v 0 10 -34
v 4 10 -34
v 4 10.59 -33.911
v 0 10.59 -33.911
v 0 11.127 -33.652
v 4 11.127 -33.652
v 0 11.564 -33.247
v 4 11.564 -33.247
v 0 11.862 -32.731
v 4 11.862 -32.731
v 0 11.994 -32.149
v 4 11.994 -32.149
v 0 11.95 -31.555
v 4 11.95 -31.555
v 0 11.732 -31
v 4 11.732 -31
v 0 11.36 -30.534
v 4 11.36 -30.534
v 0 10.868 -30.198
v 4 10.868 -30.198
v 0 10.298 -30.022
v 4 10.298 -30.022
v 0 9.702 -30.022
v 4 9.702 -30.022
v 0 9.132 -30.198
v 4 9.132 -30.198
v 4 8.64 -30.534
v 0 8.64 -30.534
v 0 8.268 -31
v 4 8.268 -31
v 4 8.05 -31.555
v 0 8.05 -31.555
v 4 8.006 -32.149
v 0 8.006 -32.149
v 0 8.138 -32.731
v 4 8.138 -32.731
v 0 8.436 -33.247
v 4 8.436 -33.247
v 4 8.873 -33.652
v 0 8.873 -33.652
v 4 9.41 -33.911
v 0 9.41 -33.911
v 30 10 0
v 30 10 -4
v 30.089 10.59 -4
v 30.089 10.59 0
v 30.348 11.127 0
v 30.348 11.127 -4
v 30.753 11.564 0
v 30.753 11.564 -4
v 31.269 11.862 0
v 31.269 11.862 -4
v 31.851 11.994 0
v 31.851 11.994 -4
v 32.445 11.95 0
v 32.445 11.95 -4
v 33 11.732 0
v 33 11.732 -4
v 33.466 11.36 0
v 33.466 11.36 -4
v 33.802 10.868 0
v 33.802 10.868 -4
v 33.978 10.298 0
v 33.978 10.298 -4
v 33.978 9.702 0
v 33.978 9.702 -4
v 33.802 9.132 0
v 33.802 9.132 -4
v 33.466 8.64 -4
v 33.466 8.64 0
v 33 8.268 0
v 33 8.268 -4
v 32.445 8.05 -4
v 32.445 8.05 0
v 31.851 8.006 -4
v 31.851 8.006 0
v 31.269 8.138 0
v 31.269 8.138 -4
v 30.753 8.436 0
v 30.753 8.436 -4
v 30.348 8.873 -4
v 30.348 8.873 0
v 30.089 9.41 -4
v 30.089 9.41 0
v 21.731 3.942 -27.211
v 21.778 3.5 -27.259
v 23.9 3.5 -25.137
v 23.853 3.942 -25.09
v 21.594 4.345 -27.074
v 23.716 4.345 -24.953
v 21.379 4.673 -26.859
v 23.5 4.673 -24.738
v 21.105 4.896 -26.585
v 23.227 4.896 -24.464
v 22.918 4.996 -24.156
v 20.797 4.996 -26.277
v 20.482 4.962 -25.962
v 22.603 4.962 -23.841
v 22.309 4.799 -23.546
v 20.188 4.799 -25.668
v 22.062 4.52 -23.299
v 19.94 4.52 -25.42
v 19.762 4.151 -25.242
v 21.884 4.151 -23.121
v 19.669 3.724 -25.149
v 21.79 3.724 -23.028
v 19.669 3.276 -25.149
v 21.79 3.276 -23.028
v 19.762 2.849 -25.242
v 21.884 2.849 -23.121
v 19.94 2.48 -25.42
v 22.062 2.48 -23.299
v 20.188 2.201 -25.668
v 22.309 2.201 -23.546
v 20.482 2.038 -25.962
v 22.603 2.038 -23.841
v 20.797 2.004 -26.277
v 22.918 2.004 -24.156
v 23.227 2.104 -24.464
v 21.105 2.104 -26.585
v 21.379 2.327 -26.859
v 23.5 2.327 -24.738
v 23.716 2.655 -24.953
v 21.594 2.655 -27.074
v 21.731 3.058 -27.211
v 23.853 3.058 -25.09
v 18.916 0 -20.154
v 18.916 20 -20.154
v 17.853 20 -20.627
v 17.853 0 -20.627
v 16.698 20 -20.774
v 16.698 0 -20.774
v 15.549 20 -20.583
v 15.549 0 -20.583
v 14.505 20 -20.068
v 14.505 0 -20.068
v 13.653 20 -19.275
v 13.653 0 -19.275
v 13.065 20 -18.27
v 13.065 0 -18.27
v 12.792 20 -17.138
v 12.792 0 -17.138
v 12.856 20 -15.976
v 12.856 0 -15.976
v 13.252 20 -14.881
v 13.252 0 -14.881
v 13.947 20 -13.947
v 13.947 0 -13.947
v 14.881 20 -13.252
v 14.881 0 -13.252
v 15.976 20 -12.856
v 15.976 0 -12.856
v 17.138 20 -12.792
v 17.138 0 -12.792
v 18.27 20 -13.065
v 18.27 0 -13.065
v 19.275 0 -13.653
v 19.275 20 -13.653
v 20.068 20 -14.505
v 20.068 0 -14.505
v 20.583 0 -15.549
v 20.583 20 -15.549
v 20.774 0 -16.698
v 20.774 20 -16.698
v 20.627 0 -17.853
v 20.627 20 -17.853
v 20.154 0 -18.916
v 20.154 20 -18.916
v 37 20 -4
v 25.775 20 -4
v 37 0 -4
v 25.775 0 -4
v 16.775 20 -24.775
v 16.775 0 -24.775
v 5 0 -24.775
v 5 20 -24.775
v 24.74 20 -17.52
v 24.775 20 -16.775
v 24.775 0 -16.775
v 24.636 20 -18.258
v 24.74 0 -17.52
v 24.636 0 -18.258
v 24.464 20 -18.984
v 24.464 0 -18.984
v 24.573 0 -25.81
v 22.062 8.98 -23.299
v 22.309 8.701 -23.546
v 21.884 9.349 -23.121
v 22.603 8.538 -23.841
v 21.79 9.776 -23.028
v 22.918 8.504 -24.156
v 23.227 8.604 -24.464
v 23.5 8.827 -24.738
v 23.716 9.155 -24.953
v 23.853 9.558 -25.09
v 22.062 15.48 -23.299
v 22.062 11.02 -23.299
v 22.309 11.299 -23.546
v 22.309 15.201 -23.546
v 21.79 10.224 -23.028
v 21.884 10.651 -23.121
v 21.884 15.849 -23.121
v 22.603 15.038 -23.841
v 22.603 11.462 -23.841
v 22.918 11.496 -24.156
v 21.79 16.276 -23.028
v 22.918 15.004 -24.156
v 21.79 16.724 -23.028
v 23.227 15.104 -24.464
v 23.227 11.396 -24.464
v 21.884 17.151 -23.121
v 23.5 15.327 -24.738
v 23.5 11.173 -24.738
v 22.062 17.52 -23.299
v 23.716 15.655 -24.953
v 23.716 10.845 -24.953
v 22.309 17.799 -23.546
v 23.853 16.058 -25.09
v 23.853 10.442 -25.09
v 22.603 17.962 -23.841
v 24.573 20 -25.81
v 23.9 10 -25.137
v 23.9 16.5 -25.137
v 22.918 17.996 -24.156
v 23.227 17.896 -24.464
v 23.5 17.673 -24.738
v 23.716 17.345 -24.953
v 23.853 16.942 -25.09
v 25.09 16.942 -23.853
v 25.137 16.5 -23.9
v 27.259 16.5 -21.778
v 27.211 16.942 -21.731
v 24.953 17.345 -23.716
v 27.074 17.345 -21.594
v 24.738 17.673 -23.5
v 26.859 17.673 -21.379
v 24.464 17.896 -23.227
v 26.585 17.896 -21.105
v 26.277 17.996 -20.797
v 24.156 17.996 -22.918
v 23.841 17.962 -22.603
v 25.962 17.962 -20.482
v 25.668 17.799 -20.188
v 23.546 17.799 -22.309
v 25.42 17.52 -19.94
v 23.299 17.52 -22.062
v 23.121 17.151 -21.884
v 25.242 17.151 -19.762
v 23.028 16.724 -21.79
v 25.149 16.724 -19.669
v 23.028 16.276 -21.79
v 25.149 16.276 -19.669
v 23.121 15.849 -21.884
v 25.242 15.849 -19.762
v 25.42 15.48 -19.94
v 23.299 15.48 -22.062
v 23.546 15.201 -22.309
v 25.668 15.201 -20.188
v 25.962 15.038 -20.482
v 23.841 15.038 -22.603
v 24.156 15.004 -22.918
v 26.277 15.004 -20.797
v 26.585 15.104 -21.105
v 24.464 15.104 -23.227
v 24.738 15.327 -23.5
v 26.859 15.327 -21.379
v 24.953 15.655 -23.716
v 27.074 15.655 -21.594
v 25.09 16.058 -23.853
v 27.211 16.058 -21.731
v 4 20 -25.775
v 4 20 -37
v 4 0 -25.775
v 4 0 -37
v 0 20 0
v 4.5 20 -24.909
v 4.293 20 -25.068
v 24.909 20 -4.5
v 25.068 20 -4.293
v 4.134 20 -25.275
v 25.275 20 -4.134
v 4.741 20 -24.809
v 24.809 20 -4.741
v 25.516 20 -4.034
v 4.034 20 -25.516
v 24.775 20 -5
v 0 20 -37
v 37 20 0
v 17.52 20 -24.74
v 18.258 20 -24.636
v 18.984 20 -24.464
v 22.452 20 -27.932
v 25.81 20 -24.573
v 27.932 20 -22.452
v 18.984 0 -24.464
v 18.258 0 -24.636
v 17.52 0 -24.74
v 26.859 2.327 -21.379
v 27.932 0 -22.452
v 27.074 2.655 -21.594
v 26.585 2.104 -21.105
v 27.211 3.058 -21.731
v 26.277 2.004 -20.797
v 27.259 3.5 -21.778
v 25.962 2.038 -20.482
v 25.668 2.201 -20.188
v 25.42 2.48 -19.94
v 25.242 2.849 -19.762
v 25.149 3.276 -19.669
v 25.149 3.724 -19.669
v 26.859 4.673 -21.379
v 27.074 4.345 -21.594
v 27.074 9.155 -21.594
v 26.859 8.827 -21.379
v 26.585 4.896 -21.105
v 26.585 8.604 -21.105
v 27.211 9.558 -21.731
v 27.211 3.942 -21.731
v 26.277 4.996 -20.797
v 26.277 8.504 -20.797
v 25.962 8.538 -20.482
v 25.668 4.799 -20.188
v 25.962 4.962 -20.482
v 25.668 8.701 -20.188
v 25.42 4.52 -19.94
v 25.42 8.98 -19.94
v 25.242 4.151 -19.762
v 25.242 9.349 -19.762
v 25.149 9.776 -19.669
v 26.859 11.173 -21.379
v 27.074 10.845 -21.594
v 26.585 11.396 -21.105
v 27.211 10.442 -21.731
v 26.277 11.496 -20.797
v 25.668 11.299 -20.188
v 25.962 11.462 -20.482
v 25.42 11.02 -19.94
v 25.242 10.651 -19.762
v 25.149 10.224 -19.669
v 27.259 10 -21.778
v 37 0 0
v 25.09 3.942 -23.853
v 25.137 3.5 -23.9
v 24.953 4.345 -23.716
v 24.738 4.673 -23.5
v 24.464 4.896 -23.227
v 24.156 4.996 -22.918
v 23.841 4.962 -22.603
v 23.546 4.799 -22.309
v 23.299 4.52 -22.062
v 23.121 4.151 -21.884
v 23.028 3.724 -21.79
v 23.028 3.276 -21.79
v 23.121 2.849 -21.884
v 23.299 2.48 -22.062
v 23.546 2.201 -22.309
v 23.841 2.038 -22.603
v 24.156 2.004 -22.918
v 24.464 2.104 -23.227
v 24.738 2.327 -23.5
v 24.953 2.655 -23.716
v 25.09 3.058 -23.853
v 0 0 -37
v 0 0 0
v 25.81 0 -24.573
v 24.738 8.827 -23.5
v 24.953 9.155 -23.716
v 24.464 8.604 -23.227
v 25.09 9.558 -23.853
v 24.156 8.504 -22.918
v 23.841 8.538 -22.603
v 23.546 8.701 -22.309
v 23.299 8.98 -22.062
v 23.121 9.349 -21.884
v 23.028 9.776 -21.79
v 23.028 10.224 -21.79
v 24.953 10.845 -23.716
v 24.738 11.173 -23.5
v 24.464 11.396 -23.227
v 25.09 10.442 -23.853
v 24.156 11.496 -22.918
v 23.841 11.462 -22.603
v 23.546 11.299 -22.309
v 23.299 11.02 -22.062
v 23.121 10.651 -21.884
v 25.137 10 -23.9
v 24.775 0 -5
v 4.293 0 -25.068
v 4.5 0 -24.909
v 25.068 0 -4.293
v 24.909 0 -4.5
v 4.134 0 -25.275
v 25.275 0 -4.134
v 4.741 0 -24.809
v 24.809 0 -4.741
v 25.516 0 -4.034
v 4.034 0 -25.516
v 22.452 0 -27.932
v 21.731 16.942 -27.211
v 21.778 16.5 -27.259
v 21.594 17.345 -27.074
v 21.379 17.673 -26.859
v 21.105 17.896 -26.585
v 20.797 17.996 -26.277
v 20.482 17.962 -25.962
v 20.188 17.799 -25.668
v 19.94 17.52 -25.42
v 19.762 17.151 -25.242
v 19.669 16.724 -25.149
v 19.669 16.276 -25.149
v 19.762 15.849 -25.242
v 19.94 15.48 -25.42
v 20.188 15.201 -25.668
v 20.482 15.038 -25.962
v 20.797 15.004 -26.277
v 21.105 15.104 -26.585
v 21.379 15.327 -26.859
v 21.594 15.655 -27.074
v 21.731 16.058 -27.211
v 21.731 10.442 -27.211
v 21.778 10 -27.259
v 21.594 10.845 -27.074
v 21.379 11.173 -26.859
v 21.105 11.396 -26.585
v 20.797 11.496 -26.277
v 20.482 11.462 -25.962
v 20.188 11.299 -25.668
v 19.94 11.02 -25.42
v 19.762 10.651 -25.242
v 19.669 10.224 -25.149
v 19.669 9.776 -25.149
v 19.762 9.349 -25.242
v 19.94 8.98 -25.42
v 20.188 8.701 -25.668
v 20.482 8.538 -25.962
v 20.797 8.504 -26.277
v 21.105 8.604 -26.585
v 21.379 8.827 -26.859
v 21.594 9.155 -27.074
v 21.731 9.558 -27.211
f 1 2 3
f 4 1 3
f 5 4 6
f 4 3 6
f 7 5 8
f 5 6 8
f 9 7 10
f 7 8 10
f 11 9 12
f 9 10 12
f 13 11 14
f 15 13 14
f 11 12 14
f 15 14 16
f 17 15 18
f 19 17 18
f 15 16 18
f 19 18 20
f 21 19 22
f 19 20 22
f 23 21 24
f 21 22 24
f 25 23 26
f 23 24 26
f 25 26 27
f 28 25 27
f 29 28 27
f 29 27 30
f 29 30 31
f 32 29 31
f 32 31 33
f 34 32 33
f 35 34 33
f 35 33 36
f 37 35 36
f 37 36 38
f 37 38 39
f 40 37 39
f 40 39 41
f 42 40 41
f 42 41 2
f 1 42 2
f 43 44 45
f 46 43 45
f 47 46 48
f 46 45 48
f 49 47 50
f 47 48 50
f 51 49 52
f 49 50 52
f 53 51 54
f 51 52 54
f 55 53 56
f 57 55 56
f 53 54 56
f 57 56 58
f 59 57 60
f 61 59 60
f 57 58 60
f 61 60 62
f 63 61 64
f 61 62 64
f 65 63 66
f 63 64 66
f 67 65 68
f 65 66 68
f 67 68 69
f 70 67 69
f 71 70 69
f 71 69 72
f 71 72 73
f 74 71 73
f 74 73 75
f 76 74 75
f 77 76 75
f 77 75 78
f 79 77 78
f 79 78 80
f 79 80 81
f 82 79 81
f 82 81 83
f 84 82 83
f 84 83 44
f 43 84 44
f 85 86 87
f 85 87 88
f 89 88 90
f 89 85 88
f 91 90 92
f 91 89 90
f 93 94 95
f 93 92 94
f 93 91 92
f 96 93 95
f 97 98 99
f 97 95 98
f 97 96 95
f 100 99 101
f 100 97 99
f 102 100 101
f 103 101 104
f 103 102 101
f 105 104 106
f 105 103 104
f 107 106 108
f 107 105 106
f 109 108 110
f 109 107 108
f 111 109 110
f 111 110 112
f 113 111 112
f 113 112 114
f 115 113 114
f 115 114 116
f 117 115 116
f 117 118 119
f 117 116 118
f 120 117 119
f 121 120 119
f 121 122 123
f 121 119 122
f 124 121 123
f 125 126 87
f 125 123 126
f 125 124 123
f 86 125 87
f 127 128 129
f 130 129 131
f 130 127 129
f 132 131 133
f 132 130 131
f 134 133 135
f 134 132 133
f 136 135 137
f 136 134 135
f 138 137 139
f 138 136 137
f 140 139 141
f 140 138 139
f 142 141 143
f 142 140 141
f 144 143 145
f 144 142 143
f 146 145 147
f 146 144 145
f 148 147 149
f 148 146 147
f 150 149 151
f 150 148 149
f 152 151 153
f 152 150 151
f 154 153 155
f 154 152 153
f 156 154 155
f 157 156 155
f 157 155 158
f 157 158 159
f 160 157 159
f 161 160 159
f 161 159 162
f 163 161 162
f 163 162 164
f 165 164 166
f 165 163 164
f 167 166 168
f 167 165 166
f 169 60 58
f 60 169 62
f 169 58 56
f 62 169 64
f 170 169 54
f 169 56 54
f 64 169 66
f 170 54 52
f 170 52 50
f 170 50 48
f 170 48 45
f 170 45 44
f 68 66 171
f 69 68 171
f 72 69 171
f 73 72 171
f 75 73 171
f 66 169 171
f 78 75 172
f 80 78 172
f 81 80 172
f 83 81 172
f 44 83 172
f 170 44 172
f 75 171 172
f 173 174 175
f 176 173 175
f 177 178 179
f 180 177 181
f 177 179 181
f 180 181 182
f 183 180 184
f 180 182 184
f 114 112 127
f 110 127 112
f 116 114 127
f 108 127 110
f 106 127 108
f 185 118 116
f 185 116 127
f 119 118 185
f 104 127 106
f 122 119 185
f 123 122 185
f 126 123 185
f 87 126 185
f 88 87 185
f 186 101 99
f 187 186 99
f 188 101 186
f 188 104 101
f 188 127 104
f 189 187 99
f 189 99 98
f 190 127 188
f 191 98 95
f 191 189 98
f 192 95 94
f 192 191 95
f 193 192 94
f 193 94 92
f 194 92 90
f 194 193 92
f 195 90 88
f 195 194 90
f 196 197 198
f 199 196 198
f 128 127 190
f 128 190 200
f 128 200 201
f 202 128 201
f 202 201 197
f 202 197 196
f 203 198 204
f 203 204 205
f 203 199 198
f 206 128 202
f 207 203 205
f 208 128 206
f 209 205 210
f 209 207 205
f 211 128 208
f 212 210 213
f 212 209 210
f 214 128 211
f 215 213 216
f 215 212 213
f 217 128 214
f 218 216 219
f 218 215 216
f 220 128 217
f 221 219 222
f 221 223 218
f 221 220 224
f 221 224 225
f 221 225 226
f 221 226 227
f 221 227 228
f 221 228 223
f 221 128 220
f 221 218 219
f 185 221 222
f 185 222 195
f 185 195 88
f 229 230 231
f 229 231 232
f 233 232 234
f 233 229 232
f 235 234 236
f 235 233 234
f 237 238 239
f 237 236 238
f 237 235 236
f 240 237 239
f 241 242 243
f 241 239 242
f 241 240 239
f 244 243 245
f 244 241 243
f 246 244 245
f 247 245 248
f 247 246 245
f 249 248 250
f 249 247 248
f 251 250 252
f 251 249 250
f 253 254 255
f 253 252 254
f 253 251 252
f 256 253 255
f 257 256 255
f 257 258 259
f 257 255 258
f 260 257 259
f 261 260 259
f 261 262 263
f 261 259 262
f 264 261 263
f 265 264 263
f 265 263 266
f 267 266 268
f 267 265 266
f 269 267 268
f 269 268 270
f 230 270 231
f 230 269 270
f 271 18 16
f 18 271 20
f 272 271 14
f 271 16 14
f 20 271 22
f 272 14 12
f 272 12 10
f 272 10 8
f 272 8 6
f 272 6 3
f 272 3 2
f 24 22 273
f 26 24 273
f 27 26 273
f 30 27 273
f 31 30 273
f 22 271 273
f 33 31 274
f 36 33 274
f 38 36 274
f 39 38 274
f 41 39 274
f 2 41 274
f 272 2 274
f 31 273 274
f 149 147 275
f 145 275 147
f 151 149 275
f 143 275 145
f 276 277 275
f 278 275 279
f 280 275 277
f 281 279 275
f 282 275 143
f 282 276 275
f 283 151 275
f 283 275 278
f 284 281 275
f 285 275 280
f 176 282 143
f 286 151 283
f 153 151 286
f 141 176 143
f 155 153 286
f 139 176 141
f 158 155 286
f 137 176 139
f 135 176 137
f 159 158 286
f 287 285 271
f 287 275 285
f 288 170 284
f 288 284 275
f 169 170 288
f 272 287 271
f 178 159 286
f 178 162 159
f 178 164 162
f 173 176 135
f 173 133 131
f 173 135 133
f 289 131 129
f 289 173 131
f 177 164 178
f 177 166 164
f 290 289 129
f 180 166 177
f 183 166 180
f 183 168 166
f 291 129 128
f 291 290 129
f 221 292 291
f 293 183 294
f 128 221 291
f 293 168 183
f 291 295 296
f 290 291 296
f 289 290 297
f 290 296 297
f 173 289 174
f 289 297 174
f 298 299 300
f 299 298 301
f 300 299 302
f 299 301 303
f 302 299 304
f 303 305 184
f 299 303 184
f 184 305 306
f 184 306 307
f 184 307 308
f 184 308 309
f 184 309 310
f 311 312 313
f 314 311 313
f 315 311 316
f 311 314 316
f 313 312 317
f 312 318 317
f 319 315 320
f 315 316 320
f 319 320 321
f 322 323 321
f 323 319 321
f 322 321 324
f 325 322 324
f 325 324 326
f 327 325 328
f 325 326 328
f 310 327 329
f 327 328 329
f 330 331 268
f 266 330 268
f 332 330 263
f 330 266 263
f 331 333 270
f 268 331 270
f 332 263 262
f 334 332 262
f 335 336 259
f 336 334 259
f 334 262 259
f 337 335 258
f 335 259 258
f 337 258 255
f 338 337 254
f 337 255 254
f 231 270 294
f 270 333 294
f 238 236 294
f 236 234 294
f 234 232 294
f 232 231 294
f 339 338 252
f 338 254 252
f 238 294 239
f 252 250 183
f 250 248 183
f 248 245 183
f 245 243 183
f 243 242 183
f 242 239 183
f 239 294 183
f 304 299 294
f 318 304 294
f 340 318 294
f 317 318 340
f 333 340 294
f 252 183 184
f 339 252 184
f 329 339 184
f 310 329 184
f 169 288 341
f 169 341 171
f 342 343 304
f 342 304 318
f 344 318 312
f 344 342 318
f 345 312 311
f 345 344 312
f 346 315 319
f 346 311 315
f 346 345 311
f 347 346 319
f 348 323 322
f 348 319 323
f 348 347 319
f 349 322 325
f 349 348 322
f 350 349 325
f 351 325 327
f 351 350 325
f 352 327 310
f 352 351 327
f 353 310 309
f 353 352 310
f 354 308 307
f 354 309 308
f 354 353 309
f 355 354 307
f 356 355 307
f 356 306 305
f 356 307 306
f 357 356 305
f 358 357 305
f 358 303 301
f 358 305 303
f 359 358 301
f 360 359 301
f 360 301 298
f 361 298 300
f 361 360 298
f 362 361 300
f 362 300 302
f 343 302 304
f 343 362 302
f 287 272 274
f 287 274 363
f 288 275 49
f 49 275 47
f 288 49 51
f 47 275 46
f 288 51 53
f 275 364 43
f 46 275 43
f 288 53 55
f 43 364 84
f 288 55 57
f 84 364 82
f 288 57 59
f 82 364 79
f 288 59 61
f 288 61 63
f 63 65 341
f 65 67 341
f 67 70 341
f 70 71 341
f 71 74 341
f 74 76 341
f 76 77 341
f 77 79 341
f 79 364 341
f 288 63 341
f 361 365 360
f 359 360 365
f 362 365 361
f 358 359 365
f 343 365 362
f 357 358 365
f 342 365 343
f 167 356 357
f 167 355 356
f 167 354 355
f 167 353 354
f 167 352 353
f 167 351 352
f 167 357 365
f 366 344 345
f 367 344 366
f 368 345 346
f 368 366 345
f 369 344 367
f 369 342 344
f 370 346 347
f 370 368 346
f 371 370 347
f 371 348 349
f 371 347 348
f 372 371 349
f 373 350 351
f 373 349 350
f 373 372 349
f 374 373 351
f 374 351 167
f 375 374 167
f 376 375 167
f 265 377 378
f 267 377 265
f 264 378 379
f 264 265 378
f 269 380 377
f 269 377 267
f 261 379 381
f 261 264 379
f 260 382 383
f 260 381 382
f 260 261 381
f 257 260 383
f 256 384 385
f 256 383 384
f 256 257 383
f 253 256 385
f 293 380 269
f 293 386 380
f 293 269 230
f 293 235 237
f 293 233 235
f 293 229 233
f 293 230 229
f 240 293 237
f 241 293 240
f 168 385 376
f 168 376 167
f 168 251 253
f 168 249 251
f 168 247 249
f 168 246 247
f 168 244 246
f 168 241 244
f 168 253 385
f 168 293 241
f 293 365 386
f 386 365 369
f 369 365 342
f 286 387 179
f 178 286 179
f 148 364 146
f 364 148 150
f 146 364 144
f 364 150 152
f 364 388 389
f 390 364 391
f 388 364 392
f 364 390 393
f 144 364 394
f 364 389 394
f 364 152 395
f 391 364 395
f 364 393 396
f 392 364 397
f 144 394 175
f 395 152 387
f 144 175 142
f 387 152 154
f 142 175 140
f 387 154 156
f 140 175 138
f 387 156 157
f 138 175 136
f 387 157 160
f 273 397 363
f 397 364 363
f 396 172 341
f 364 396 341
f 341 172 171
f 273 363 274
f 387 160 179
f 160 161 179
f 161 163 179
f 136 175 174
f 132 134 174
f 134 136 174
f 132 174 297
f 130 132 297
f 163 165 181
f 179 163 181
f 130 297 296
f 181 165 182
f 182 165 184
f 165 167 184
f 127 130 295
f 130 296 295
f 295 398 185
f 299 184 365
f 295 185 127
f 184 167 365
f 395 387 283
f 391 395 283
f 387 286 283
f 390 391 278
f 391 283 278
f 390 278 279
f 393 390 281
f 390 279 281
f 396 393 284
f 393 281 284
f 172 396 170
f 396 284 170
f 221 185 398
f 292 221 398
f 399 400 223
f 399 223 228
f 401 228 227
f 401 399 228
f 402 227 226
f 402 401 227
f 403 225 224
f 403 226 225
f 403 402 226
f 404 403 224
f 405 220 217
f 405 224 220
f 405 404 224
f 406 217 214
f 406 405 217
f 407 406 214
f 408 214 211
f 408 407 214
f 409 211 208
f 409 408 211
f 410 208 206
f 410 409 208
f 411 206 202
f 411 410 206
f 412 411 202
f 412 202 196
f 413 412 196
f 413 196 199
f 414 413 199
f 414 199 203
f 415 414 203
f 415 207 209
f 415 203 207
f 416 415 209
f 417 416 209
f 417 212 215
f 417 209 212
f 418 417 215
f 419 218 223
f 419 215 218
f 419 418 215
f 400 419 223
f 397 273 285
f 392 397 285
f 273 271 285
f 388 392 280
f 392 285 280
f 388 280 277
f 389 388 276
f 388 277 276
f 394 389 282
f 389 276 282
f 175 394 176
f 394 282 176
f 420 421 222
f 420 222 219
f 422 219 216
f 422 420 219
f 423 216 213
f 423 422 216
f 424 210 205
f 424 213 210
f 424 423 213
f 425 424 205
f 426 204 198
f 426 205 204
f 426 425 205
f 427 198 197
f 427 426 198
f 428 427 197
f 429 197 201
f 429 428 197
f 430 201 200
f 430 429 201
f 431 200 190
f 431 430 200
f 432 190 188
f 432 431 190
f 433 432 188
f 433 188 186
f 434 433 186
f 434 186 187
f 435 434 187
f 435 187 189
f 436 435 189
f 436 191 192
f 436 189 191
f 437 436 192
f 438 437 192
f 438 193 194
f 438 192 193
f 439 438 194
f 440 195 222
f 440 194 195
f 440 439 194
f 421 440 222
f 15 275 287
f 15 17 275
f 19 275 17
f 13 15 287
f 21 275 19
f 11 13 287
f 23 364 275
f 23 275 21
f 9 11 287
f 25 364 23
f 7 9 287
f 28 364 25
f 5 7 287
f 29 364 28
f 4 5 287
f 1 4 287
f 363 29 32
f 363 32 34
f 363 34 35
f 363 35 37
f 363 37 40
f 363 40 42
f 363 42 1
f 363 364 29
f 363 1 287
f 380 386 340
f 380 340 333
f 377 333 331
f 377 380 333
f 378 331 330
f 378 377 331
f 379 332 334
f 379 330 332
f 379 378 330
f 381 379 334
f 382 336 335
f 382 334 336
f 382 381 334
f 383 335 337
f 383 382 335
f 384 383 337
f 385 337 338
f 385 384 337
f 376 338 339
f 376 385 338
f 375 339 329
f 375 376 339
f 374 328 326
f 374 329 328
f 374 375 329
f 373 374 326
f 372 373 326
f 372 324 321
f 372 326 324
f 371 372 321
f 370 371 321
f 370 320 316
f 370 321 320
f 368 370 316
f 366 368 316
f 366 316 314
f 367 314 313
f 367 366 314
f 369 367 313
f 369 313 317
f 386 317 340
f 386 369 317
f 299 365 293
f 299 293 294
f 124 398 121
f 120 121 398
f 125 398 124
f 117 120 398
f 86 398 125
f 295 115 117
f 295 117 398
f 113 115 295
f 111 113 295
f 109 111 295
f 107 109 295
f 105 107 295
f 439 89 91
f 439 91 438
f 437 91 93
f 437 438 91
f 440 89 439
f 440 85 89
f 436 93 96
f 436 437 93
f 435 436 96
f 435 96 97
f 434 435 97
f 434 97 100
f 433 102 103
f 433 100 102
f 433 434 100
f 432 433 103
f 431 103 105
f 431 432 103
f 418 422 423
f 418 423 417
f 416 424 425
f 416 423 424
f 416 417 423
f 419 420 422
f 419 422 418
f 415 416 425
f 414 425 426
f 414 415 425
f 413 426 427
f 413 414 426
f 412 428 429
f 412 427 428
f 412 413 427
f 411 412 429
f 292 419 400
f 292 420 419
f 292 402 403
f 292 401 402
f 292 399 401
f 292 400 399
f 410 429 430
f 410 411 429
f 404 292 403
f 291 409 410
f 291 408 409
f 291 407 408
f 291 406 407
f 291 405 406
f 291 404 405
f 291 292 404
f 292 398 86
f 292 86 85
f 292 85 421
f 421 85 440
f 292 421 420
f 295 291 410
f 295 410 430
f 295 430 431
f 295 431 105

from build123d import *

# Parameters (mm, degrees)
SKETCH1_R               = 4
SKETCH1_W               = 4
SKETCH1_H               = 4
BOSS_EXTRUDE1_DEPTH     = 20
FILLET1_R               = 1
SKETCH2_R               = 2
CUT_EXTRUDE1_DEPTH      = 20
SKETCH3_R               = 2
CUT_EXTRUDE2_DEPTH      = 20
CUT_EXTRUDE4_REACH      = 58.018
BOSS_EXTRUDE4_DEPTH     = 20
CUT_EXTRUDE5_DEPTH      = 57.151719698
CUT_EXTRUDE5_DEPTH_BACK = 57.151719698
SKETCH9_R               = 1.5


with BuildPart() as part:
    # Sketch1 → Boss-Extrude1 (new body)
    # profile 1 of 5: a face of its own
    with BuildSketch(Plane(origin=(0, 0, 0), x_dir=(1, 0, 0), z_dir=(0, 1, 0))):
        with BuildLine():
            ThreePointArc((24.775, 16.775), (11.118145751, 11.118145751), (16.775, 24.775))
            Line((16.775, 24.775), (4, 24.775))
            Line((4, 24.775), (4, 4))
            Line((4, 4), (24.775, 4))
            Line((24.775, 4), (24.775, 16.775))
        make_face()
    # profile 2 of 5: a face of its own
    with BuildSketch(Plane(origin=(0, 0, 0), x_dir=(1, 0, 0), z_dir=(0, 1, 0))):
        with BuildLine():
            ThreePointArc((24.775, 16.775), (22.431854249, 22.431854249), (16.775, 24.775))
            ThreePointArc((16.775, 24.775), (11.118145751, 11.118145751), (24.775, 16.775))
        make_face()
        with Locations(Location((16.775, 16.775, 0), (0, 0, 270))):
            Circle(SKETCH1_R, mode=Mode.SUBTRACT)
    # profile 3 of 5: a face of its own
    with BuildSketch(Plane(origin=(0, 0, 0), x_dir=(1, 0, 0), z_dir=(0, 1, 0))):
        Polygon((4, 4), (4, 24.775), (4, 37), (0, 37), (0, 4), align=None)
    # profile 4 of 5: a face of its own
    with BuildSketch(Plane(origin=(0, 0, 0), x_dir=(1, 0, 0), z_dir=(0, 1, 0))):
        Polygon((24.775, 4), (4, 4), (4, 0), (37, 0), (37, 4), align=None)
    # profile 5 of 5: a face of its own
    with BuildSketch(Plane(origin=(0, 0, 0), x_dir=(1, 0, 0), z_dir=(0, 1, 0))):
        with Locations((2, 2)):
            Rectangle(SKETCH1_W, SKETCH1_H)
    extrude(amount=BOSS_EXTRUDE1_DEPTH)

    # Fillet1
    fillet1_edges = [part.edges().sort_by_distance(p)[0] for p in [
        (24.775, 10, -4),
        (4, 10, -24.775),
    ]]
    fillet(fillet1_edges, radius=FILLET1_R)

    # Sketch2 → Cut-Extrude1 (cut)
    with BuildSketch(Plane(origin=(0, 0, -4), x_dir=(-1, 0, 0), z_dir=(0, 0, -1))):
        with Locations((-32, 10)):
            Circle(SKETCH2_R)
    extrude(amount=-CUT_EXTRUDE1_DEPTH, mode=Mode.SUBTRACT)

    # Sketch3 → Cut-Extrude2 (cut)
    with BuildSketch(Plane(origin=(4, 0, 0), x_dir=(0, 0, -1), z_dir=(1, 0, 0))):
        with Locations((32, 10)):
            Circle(SKETCH3_R)
    extrude(amount=-CUT_EXTRUDE2_DEPTH, mode=Mode.SUBTRACT)

    # Sketch7 → Cut-Extrude4 (cut, up to next)
    with BuildSketch(Plane(origin=(0, 20, 0), x_dir=(1, 0, 0), z_dir=(0, 1, 0)), mode=Mode.PRIVATE) as cut_extrude4_sk1:
        Polygon((20.153643704, 18.916206837), (18.916206837, 20.153643704), (23.158847524, 24.396284391), (24.396284391, 23.158847524), align=None)
    cut_extrude4_tool1 = extrude(cut_extrude4_sk1.sketch, amount=-CUT_EXTRUDE4_REACH, mode=Mode.PRIVATE) & part.part
    add(cut_extrude4_tool1.solids().sort_by_distance((21.656246, 20, -21.656246))[0], mode=Mode.SUBTRACT)

    # Sketch8 → Boss-Extrude4 (add)
    with BuildSketch(Plane(origin=(0, 20, 0), x_dir=(1, 0, 0), z_dir=(0, 1, 0))):
        Polygon((18.916206837, 20.153643704), (24.573061087, 25.810497954), (22.451740743, 27.931818297), (16.794886494, 22.274964048), align=None)
        Polygon((22.274964048, 16.794886494), (20.153643704, 18.916206837), (25.810497954, 24.573061087), (27.931818297, 22.451740743), align=None)
    extrude(amount=-BOSS_EXTRUDE4_DEPTH)

    # Sketch9 → Cut-Extrude5 (cut, two sides: drawn at the far end of the back side and taken through both)
    with BuildSketch(Plane(origin=(2.740038777, 0, 2.740038777), x_dir=(0.7071067811865474, 0, -0.7071067811865477), z_dir=(0.7071067811865477, 0, 0.7071067811865474)).offset(-CUT_EXTRUDE5_DEPTH_BACK)):
        with Locations((33.174436303, 16.5)):
            Circle(SKETCH9_R)
        with Locations((33.174436303, 10)):
            Circle(SKETCH9_R)
        with Locations((33.174436303, 3.5)):
            Circle(SKETCH9_R)
    extrude(amount=CUT_EXTRUDE5_DEPTH + CUT_EXTRUDE5_DEPTH_BACK, mode=Mode.SUBTRACT)


solid = part.part
